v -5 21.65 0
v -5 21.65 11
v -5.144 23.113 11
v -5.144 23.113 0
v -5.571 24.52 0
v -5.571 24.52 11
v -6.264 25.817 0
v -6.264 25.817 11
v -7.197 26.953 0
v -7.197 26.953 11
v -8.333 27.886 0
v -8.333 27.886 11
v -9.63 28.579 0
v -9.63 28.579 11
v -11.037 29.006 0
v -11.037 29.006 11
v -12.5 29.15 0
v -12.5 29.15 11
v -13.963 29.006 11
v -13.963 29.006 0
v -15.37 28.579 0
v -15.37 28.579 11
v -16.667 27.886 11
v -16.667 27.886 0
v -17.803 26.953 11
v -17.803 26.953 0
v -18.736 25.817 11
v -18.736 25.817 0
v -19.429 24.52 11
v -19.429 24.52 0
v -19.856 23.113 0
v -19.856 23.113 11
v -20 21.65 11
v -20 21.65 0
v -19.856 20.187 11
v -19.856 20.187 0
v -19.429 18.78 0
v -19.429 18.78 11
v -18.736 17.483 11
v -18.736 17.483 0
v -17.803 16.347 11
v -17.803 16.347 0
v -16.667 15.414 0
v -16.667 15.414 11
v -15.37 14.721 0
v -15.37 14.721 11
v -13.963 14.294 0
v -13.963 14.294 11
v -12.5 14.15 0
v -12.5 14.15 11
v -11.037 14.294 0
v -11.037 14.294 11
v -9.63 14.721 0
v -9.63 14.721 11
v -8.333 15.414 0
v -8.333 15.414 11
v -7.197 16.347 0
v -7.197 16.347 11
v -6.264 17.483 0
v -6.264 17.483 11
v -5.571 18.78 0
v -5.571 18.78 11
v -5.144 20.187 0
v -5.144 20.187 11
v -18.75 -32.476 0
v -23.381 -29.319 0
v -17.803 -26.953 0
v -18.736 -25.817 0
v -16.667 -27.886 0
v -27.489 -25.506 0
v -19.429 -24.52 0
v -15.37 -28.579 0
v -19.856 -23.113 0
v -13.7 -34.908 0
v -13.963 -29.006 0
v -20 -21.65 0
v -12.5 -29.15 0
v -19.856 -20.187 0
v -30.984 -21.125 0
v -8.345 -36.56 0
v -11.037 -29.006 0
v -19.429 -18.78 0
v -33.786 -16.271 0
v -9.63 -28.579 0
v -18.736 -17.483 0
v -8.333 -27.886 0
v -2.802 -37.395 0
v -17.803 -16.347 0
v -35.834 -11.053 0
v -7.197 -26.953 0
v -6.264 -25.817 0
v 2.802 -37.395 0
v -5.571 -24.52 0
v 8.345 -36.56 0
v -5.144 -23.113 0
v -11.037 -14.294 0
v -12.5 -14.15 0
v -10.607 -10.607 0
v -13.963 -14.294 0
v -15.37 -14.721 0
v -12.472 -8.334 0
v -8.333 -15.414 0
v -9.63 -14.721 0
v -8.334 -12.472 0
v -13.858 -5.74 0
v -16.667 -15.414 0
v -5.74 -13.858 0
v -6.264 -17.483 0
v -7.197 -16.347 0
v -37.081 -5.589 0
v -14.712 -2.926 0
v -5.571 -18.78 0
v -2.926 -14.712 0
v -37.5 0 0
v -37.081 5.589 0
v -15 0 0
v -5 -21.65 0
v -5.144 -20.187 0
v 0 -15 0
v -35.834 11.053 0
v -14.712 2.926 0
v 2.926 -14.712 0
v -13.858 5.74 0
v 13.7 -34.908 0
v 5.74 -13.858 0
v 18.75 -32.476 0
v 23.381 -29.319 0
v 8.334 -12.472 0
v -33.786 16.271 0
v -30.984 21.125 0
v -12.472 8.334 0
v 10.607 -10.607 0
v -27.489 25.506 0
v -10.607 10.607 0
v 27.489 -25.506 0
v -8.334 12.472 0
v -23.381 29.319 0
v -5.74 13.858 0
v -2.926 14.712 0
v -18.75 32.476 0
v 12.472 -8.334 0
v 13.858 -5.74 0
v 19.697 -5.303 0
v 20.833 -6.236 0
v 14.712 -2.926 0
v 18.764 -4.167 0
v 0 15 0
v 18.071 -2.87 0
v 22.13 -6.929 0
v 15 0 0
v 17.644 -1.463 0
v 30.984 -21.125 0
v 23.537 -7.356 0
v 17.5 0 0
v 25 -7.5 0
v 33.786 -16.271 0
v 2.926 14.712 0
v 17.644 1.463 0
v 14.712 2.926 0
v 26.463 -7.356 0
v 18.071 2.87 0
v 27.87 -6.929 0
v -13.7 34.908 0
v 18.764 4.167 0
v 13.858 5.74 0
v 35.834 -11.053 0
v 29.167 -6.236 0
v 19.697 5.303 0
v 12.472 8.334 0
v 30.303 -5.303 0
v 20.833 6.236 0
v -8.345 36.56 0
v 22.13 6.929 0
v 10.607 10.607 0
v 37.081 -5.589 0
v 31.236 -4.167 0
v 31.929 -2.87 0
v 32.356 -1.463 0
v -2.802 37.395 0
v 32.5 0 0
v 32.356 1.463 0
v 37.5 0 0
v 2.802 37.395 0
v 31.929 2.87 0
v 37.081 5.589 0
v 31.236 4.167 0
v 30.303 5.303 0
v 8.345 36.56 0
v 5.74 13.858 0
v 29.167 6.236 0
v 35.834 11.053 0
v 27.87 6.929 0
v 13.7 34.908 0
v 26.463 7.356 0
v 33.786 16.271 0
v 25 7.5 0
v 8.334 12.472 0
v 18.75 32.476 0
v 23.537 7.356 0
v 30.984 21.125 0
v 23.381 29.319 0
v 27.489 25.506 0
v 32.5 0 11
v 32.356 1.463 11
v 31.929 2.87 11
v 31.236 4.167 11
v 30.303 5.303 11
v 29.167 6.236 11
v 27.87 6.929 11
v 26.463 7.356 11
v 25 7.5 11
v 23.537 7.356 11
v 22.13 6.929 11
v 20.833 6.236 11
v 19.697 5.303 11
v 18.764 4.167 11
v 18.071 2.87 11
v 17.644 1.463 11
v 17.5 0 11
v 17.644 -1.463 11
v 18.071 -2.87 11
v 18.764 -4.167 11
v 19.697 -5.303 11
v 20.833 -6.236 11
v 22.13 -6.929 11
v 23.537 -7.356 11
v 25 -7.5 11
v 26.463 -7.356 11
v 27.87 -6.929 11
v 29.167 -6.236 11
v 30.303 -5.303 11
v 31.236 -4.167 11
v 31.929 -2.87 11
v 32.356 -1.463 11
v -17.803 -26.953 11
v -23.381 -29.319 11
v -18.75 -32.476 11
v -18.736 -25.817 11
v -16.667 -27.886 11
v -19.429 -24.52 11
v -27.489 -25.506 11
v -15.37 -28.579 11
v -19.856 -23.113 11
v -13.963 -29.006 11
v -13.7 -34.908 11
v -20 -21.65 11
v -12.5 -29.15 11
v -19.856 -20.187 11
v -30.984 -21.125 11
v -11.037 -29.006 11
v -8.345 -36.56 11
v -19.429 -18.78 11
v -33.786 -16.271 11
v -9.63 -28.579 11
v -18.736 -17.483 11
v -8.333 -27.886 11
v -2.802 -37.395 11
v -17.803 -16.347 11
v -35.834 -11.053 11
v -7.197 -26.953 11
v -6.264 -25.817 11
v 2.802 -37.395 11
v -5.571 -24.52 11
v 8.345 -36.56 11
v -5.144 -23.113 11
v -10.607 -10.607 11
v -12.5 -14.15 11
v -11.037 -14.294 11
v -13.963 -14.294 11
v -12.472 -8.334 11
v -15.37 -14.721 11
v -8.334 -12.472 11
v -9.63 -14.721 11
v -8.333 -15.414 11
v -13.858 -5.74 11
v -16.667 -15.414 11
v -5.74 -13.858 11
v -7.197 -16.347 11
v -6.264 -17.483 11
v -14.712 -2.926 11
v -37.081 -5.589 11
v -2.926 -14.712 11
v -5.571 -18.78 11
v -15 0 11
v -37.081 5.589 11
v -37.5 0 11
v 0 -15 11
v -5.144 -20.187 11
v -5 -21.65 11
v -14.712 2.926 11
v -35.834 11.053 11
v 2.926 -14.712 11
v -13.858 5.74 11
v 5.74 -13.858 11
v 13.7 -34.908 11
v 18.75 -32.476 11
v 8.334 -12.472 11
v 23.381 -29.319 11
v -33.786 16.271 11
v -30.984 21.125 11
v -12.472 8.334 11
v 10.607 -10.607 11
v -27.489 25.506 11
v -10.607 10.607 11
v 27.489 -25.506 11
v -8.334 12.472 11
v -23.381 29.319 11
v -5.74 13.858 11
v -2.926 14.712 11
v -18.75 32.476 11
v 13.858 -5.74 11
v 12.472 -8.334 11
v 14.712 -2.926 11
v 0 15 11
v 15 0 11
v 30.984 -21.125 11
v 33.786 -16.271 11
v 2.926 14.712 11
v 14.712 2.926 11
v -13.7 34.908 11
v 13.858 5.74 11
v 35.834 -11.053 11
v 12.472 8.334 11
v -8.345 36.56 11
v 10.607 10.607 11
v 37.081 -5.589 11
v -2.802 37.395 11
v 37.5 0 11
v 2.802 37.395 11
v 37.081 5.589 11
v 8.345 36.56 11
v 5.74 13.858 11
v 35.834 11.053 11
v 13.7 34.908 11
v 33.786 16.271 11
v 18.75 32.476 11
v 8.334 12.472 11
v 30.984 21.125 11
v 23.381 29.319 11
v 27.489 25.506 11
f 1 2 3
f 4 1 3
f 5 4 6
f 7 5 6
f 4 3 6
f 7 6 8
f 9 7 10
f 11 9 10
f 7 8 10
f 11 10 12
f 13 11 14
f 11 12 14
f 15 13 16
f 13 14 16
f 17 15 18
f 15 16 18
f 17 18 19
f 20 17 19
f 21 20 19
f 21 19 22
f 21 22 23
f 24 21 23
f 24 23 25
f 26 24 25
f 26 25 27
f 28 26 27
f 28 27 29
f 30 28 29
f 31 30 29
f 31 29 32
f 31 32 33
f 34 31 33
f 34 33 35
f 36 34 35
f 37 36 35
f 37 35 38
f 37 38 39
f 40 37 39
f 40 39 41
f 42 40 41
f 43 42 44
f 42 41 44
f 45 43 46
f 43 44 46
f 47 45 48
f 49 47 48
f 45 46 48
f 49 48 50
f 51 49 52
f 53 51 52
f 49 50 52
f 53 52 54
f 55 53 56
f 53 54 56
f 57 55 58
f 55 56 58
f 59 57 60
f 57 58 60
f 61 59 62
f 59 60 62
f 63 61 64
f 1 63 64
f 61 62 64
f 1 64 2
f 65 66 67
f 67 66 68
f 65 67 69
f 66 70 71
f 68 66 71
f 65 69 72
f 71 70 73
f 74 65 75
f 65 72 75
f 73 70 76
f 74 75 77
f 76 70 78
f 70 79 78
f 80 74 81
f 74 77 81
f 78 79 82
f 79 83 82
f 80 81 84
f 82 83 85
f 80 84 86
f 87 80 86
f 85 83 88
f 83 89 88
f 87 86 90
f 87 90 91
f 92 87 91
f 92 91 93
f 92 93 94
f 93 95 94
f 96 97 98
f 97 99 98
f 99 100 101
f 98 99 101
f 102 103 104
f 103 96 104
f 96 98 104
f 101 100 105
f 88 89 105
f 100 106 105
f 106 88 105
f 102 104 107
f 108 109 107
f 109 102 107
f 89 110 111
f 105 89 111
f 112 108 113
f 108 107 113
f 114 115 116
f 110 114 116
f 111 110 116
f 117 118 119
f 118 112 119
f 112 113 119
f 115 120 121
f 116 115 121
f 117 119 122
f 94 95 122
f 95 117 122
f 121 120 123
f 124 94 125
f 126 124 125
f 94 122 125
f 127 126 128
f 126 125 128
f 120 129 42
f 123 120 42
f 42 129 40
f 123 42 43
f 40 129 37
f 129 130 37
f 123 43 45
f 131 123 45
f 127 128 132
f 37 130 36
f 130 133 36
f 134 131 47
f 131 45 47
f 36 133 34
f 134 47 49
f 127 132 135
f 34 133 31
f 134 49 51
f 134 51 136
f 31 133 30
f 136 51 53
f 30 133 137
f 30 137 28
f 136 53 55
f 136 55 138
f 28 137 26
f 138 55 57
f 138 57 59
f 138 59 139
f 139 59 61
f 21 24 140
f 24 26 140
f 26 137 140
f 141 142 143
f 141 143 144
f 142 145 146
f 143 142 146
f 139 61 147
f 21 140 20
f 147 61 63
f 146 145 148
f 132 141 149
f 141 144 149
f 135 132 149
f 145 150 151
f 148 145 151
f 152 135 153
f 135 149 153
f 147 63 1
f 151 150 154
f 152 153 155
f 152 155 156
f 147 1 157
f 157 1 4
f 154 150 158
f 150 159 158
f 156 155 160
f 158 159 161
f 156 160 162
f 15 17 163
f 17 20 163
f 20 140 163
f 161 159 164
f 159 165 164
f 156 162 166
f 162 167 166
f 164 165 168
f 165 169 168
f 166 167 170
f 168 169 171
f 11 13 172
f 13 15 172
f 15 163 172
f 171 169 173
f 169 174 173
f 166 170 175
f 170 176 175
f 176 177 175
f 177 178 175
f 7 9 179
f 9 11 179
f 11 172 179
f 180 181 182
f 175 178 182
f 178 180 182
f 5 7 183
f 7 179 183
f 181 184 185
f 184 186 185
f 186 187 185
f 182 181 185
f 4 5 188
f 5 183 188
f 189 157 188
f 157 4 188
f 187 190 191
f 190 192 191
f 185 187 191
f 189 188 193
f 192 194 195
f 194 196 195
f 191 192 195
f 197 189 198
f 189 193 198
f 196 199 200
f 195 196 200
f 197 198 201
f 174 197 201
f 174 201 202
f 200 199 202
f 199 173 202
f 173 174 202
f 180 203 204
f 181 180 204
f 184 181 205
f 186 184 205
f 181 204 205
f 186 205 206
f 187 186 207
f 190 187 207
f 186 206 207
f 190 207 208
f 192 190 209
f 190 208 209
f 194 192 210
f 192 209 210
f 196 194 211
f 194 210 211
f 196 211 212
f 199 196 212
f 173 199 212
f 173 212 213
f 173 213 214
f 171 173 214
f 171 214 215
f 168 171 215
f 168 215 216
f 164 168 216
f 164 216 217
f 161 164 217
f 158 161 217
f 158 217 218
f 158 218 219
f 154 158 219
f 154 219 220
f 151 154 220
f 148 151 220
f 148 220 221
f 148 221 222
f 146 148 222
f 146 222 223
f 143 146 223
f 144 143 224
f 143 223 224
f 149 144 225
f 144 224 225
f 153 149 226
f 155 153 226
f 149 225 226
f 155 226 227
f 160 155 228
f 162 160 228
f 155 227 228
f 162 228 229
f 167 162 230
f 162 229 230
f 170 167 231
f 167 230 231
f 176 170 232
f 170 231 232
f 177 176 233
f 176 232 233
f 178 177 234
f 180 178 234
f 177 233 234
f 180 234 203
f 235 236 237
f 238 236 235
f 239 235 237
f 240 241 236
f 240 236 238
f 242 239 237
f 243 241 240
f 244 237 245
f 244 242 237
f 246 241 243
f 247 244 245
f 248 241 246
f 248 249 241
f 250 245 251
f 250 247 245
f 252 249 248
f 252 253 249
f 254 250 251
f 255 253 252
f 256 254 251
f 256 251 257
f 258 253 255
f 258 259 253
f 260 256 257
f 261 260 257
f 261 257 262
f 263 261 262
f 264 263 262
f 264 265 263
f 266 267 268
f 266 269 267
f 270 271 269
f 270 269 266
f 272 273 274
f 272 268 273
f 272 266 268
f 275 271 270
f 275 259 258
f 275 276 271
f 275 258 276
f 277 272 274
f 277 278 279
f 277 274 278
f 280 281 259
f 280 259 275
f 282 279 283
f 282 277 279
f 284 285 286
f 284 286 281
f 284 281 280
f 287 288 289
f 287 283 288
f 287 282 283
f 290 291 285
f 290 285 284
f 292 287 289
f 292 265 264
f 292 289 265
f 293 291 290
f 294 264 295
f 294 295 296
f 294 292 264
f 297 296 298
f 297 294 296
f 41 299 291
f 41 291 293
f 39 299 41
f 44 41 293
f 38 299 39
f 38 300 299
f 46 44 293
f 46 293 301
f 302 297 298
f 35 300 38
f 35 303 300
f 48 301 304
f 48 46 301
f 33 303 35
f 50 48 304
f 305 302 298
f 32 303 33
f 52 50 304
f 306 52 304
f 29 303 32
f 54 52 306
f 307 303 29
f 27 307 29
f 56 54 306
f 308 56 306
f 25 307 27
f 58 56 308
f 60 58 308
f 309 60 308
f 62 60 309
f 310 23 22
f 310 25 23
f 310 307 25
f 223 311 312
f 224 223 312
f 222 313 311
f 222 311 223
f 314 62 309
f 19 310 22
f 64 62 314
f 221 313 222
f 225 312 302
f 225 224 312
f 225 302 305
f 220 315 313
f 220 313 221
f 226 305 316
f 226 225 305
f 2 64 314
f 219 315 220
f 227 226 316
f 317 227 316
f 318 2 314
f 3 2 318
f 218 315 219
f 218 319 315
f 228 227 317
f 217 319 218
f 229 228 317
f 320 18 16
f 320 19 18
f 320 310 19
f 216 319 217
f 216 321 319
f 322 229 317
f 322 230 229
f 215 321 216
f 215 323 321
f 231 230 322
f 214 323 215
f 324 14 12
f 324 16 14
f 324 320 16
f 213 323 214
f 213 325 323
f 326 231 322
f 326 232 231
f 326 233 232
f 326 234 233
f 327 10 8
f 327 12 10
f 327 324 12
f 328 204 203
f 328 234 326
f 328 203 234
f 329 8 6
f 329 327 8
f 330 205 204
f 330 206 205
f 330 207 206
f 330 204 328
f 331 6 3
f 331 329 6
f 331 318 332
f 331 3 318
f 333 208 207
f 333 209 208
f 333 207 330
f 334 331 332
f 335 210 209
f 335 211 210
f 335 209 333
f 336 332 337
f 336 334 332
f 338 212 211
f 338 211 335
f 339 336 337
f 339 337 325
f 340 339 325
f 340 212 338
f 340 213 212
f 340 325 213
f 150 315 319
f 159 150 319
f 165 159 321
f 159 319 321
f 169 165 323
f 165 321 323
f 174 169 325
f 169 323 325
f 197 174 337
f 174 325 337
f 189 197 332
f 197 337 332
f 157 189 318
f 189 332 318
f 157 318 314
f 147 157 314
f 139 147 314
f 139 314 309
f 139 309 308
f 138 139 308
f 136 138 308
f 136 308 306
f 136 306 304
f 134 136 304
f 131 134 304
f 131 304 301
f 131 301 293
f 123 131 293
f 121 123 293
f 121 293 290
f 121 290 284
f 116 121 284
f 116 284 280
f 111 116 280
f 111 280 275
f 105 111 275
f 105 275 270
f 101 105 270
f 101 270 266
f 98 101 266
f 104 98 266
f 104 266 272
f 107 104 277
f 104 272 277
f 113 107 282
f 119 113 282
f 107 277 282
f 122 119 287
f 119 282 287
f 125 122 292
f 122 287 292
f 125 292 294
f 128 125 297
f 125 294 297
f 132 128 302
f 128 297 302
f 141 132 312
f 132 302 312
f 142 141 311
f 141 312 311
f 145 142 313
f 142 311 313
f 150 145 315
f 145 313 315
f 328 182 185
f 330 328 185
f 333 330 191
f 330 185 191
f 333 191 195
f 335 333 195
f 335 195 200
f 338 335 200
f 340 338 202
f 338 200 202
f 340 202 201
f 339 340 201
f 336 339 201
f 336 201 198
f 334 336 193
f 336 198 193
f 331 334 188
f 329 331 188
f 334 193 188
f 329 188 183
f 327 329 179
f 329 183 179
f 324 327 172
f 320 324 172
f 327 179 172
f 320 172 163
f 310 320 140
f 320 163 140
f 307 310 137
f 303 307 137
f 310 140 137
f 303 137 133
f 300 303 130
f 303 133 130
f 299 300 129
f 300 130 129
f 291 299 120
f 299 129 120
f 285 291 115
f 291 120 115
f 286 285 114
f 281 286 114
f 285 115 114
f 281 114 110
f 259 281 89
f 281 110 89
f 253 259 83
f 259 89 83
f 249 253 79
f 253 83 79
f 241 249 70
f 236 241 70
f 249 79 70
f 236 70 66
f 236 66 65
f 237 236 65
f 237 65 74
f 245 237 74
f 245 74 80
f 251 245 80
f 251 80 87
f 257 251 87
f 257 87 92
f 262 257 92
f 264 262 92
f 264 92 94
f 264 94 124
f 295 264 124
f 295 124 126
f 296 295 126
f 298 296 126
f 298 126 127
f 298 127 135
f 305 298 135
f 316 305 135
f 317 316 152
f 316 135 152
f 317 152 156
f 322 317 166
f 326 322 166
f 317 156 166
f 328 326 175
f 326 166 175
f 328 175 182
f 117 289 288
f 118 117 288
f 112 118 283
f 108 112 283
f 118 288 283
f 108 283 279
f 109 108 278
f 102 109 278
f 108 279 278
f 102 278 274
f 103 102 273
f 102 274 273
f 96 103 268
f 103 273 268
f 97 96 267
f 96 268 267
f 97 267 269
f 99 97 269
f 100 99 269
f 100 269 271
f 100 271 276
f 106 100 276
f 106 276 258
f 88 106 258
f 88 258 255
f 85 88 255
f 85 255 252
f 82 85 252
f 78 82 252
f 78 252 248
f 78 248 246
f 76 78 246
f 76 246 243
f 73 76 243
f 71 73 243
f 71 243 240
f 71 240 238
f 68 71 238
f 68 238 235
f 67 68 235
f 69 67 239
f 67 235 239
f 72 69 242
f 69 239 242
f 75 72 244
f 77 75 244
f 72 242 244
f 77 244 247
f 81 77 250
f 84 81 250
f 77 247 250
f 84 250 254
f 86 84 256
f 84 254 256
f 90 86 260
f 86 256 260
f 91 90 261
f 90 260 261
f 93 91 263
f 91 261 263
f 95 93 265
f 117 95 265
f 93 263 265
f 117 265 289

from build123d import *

# Parameters (mm, degrees)
SKETCH_1_R     = 37.5
PAD_1_DEPTH    = 11
SKETCH_2_R     = 15
POCKET_2_DEPTH = 11.001
SKETCH_3_R     = 4.5
POCKET_3_DEPTH = 11.001
SKETCH_4_R     = 4.5
POCKET_4_DEPTH = 11.001
SKETCH_5_R     = 4.5
POCKET_5_DEPTH = 11.001
SKETCH_6_R     = 7.5
POCKET_6_DEPTH = 11.001
SKETCH_7_R     = 7.5
POCKET_7_DEPTH = 11.001
SKETCH_8_R     = 7.5
POCKET_8_DEPTH = 11.001


with BuildPart() as part:
    # Sketch_1 → Pad_1 (new body)
    with BuildSketch(Plane.XY):
        Circle(SKETCH_1_R)
    extrude(amount=PAD_1_DEPTH)

    # Sketch_2 (on Face3 of Pad_1) → Pocket_2 (cut, through all)
    with BuildSketch(Plane.XY.offset(11)):
        Circle(SKETCH_2_R)
    extrude(amount=-POCKET_2_DEPTH, mode=Mode.SUBTRACT)

    # Sketch_3 (on Face3 of Pocket_2) → Pocket_3 (cut, through all)
    with BuildSketch(Plane.XY.offset(11)):
        with Locations((25, 0)):
            Circle(SKETCH_3_R)
    extrude(amount=-POCKET_3_DEPTH, mode=Mode.SUBTRACT)

    # Sketch_4 (on Face3 of Pocket_3) → Pocket_4 (cut, through all)
    with BuildSketch(Plane.XY.offset(11)):
        with Locations((-12.5, 21.65)):
            Circle(SKETCH_4_R)
    extrude(amount=-POCKET_4_DEPTH, mode=Mode.SUBTRACT)

    # Sketch_5 (on Face3 of Pocket_4) → Pocket_5 (cut, through all)
    with BuildSketch(Plane.XY.offset(11)):
        with Locations((-12.5, -21.65)):
            Circle(SKETCH_5_R)
    extrude(amount=-POCKET_5_DEPTH, mode=Mode.SUBTRACT)

    # Sketch_6 (on Face3 of Pocket_5) → Pocket_6 (cut, through all)
    with BuildSketch(Plane.XY.offset(11)):
        with Locations((25, 0)):
            Circle(SKETCH_6_R)
    extrude(amount=-POCKET_6_DEPTH, mode=Mode.SUBTRACT)

    # Sketch_7 (on Face3 of Pocket_6) → Pocket_7 (cut, through all)
    with BuildSketch(Plane.XY.offset(11)):
        with Locations((-12.5, 21.65)):
            Circle(SKETCH_7_R)
    extrude(amount=-POCKET_7_DEPTH, mode=Mode.SUBTRACT)

    # Sketch_8 (on Face3 of Pocket_7) → Pocket_8 (cut, through all)
    with BuildSketch(Plane.XY.offset(11)):
        with Locations((-12.5, -21.65)):
            Circle(SKETCH_8_R)
    extrude(amount=-POCKET_8_DEPTH, mode=Mode.SUBTRACT)


solid = part.part
